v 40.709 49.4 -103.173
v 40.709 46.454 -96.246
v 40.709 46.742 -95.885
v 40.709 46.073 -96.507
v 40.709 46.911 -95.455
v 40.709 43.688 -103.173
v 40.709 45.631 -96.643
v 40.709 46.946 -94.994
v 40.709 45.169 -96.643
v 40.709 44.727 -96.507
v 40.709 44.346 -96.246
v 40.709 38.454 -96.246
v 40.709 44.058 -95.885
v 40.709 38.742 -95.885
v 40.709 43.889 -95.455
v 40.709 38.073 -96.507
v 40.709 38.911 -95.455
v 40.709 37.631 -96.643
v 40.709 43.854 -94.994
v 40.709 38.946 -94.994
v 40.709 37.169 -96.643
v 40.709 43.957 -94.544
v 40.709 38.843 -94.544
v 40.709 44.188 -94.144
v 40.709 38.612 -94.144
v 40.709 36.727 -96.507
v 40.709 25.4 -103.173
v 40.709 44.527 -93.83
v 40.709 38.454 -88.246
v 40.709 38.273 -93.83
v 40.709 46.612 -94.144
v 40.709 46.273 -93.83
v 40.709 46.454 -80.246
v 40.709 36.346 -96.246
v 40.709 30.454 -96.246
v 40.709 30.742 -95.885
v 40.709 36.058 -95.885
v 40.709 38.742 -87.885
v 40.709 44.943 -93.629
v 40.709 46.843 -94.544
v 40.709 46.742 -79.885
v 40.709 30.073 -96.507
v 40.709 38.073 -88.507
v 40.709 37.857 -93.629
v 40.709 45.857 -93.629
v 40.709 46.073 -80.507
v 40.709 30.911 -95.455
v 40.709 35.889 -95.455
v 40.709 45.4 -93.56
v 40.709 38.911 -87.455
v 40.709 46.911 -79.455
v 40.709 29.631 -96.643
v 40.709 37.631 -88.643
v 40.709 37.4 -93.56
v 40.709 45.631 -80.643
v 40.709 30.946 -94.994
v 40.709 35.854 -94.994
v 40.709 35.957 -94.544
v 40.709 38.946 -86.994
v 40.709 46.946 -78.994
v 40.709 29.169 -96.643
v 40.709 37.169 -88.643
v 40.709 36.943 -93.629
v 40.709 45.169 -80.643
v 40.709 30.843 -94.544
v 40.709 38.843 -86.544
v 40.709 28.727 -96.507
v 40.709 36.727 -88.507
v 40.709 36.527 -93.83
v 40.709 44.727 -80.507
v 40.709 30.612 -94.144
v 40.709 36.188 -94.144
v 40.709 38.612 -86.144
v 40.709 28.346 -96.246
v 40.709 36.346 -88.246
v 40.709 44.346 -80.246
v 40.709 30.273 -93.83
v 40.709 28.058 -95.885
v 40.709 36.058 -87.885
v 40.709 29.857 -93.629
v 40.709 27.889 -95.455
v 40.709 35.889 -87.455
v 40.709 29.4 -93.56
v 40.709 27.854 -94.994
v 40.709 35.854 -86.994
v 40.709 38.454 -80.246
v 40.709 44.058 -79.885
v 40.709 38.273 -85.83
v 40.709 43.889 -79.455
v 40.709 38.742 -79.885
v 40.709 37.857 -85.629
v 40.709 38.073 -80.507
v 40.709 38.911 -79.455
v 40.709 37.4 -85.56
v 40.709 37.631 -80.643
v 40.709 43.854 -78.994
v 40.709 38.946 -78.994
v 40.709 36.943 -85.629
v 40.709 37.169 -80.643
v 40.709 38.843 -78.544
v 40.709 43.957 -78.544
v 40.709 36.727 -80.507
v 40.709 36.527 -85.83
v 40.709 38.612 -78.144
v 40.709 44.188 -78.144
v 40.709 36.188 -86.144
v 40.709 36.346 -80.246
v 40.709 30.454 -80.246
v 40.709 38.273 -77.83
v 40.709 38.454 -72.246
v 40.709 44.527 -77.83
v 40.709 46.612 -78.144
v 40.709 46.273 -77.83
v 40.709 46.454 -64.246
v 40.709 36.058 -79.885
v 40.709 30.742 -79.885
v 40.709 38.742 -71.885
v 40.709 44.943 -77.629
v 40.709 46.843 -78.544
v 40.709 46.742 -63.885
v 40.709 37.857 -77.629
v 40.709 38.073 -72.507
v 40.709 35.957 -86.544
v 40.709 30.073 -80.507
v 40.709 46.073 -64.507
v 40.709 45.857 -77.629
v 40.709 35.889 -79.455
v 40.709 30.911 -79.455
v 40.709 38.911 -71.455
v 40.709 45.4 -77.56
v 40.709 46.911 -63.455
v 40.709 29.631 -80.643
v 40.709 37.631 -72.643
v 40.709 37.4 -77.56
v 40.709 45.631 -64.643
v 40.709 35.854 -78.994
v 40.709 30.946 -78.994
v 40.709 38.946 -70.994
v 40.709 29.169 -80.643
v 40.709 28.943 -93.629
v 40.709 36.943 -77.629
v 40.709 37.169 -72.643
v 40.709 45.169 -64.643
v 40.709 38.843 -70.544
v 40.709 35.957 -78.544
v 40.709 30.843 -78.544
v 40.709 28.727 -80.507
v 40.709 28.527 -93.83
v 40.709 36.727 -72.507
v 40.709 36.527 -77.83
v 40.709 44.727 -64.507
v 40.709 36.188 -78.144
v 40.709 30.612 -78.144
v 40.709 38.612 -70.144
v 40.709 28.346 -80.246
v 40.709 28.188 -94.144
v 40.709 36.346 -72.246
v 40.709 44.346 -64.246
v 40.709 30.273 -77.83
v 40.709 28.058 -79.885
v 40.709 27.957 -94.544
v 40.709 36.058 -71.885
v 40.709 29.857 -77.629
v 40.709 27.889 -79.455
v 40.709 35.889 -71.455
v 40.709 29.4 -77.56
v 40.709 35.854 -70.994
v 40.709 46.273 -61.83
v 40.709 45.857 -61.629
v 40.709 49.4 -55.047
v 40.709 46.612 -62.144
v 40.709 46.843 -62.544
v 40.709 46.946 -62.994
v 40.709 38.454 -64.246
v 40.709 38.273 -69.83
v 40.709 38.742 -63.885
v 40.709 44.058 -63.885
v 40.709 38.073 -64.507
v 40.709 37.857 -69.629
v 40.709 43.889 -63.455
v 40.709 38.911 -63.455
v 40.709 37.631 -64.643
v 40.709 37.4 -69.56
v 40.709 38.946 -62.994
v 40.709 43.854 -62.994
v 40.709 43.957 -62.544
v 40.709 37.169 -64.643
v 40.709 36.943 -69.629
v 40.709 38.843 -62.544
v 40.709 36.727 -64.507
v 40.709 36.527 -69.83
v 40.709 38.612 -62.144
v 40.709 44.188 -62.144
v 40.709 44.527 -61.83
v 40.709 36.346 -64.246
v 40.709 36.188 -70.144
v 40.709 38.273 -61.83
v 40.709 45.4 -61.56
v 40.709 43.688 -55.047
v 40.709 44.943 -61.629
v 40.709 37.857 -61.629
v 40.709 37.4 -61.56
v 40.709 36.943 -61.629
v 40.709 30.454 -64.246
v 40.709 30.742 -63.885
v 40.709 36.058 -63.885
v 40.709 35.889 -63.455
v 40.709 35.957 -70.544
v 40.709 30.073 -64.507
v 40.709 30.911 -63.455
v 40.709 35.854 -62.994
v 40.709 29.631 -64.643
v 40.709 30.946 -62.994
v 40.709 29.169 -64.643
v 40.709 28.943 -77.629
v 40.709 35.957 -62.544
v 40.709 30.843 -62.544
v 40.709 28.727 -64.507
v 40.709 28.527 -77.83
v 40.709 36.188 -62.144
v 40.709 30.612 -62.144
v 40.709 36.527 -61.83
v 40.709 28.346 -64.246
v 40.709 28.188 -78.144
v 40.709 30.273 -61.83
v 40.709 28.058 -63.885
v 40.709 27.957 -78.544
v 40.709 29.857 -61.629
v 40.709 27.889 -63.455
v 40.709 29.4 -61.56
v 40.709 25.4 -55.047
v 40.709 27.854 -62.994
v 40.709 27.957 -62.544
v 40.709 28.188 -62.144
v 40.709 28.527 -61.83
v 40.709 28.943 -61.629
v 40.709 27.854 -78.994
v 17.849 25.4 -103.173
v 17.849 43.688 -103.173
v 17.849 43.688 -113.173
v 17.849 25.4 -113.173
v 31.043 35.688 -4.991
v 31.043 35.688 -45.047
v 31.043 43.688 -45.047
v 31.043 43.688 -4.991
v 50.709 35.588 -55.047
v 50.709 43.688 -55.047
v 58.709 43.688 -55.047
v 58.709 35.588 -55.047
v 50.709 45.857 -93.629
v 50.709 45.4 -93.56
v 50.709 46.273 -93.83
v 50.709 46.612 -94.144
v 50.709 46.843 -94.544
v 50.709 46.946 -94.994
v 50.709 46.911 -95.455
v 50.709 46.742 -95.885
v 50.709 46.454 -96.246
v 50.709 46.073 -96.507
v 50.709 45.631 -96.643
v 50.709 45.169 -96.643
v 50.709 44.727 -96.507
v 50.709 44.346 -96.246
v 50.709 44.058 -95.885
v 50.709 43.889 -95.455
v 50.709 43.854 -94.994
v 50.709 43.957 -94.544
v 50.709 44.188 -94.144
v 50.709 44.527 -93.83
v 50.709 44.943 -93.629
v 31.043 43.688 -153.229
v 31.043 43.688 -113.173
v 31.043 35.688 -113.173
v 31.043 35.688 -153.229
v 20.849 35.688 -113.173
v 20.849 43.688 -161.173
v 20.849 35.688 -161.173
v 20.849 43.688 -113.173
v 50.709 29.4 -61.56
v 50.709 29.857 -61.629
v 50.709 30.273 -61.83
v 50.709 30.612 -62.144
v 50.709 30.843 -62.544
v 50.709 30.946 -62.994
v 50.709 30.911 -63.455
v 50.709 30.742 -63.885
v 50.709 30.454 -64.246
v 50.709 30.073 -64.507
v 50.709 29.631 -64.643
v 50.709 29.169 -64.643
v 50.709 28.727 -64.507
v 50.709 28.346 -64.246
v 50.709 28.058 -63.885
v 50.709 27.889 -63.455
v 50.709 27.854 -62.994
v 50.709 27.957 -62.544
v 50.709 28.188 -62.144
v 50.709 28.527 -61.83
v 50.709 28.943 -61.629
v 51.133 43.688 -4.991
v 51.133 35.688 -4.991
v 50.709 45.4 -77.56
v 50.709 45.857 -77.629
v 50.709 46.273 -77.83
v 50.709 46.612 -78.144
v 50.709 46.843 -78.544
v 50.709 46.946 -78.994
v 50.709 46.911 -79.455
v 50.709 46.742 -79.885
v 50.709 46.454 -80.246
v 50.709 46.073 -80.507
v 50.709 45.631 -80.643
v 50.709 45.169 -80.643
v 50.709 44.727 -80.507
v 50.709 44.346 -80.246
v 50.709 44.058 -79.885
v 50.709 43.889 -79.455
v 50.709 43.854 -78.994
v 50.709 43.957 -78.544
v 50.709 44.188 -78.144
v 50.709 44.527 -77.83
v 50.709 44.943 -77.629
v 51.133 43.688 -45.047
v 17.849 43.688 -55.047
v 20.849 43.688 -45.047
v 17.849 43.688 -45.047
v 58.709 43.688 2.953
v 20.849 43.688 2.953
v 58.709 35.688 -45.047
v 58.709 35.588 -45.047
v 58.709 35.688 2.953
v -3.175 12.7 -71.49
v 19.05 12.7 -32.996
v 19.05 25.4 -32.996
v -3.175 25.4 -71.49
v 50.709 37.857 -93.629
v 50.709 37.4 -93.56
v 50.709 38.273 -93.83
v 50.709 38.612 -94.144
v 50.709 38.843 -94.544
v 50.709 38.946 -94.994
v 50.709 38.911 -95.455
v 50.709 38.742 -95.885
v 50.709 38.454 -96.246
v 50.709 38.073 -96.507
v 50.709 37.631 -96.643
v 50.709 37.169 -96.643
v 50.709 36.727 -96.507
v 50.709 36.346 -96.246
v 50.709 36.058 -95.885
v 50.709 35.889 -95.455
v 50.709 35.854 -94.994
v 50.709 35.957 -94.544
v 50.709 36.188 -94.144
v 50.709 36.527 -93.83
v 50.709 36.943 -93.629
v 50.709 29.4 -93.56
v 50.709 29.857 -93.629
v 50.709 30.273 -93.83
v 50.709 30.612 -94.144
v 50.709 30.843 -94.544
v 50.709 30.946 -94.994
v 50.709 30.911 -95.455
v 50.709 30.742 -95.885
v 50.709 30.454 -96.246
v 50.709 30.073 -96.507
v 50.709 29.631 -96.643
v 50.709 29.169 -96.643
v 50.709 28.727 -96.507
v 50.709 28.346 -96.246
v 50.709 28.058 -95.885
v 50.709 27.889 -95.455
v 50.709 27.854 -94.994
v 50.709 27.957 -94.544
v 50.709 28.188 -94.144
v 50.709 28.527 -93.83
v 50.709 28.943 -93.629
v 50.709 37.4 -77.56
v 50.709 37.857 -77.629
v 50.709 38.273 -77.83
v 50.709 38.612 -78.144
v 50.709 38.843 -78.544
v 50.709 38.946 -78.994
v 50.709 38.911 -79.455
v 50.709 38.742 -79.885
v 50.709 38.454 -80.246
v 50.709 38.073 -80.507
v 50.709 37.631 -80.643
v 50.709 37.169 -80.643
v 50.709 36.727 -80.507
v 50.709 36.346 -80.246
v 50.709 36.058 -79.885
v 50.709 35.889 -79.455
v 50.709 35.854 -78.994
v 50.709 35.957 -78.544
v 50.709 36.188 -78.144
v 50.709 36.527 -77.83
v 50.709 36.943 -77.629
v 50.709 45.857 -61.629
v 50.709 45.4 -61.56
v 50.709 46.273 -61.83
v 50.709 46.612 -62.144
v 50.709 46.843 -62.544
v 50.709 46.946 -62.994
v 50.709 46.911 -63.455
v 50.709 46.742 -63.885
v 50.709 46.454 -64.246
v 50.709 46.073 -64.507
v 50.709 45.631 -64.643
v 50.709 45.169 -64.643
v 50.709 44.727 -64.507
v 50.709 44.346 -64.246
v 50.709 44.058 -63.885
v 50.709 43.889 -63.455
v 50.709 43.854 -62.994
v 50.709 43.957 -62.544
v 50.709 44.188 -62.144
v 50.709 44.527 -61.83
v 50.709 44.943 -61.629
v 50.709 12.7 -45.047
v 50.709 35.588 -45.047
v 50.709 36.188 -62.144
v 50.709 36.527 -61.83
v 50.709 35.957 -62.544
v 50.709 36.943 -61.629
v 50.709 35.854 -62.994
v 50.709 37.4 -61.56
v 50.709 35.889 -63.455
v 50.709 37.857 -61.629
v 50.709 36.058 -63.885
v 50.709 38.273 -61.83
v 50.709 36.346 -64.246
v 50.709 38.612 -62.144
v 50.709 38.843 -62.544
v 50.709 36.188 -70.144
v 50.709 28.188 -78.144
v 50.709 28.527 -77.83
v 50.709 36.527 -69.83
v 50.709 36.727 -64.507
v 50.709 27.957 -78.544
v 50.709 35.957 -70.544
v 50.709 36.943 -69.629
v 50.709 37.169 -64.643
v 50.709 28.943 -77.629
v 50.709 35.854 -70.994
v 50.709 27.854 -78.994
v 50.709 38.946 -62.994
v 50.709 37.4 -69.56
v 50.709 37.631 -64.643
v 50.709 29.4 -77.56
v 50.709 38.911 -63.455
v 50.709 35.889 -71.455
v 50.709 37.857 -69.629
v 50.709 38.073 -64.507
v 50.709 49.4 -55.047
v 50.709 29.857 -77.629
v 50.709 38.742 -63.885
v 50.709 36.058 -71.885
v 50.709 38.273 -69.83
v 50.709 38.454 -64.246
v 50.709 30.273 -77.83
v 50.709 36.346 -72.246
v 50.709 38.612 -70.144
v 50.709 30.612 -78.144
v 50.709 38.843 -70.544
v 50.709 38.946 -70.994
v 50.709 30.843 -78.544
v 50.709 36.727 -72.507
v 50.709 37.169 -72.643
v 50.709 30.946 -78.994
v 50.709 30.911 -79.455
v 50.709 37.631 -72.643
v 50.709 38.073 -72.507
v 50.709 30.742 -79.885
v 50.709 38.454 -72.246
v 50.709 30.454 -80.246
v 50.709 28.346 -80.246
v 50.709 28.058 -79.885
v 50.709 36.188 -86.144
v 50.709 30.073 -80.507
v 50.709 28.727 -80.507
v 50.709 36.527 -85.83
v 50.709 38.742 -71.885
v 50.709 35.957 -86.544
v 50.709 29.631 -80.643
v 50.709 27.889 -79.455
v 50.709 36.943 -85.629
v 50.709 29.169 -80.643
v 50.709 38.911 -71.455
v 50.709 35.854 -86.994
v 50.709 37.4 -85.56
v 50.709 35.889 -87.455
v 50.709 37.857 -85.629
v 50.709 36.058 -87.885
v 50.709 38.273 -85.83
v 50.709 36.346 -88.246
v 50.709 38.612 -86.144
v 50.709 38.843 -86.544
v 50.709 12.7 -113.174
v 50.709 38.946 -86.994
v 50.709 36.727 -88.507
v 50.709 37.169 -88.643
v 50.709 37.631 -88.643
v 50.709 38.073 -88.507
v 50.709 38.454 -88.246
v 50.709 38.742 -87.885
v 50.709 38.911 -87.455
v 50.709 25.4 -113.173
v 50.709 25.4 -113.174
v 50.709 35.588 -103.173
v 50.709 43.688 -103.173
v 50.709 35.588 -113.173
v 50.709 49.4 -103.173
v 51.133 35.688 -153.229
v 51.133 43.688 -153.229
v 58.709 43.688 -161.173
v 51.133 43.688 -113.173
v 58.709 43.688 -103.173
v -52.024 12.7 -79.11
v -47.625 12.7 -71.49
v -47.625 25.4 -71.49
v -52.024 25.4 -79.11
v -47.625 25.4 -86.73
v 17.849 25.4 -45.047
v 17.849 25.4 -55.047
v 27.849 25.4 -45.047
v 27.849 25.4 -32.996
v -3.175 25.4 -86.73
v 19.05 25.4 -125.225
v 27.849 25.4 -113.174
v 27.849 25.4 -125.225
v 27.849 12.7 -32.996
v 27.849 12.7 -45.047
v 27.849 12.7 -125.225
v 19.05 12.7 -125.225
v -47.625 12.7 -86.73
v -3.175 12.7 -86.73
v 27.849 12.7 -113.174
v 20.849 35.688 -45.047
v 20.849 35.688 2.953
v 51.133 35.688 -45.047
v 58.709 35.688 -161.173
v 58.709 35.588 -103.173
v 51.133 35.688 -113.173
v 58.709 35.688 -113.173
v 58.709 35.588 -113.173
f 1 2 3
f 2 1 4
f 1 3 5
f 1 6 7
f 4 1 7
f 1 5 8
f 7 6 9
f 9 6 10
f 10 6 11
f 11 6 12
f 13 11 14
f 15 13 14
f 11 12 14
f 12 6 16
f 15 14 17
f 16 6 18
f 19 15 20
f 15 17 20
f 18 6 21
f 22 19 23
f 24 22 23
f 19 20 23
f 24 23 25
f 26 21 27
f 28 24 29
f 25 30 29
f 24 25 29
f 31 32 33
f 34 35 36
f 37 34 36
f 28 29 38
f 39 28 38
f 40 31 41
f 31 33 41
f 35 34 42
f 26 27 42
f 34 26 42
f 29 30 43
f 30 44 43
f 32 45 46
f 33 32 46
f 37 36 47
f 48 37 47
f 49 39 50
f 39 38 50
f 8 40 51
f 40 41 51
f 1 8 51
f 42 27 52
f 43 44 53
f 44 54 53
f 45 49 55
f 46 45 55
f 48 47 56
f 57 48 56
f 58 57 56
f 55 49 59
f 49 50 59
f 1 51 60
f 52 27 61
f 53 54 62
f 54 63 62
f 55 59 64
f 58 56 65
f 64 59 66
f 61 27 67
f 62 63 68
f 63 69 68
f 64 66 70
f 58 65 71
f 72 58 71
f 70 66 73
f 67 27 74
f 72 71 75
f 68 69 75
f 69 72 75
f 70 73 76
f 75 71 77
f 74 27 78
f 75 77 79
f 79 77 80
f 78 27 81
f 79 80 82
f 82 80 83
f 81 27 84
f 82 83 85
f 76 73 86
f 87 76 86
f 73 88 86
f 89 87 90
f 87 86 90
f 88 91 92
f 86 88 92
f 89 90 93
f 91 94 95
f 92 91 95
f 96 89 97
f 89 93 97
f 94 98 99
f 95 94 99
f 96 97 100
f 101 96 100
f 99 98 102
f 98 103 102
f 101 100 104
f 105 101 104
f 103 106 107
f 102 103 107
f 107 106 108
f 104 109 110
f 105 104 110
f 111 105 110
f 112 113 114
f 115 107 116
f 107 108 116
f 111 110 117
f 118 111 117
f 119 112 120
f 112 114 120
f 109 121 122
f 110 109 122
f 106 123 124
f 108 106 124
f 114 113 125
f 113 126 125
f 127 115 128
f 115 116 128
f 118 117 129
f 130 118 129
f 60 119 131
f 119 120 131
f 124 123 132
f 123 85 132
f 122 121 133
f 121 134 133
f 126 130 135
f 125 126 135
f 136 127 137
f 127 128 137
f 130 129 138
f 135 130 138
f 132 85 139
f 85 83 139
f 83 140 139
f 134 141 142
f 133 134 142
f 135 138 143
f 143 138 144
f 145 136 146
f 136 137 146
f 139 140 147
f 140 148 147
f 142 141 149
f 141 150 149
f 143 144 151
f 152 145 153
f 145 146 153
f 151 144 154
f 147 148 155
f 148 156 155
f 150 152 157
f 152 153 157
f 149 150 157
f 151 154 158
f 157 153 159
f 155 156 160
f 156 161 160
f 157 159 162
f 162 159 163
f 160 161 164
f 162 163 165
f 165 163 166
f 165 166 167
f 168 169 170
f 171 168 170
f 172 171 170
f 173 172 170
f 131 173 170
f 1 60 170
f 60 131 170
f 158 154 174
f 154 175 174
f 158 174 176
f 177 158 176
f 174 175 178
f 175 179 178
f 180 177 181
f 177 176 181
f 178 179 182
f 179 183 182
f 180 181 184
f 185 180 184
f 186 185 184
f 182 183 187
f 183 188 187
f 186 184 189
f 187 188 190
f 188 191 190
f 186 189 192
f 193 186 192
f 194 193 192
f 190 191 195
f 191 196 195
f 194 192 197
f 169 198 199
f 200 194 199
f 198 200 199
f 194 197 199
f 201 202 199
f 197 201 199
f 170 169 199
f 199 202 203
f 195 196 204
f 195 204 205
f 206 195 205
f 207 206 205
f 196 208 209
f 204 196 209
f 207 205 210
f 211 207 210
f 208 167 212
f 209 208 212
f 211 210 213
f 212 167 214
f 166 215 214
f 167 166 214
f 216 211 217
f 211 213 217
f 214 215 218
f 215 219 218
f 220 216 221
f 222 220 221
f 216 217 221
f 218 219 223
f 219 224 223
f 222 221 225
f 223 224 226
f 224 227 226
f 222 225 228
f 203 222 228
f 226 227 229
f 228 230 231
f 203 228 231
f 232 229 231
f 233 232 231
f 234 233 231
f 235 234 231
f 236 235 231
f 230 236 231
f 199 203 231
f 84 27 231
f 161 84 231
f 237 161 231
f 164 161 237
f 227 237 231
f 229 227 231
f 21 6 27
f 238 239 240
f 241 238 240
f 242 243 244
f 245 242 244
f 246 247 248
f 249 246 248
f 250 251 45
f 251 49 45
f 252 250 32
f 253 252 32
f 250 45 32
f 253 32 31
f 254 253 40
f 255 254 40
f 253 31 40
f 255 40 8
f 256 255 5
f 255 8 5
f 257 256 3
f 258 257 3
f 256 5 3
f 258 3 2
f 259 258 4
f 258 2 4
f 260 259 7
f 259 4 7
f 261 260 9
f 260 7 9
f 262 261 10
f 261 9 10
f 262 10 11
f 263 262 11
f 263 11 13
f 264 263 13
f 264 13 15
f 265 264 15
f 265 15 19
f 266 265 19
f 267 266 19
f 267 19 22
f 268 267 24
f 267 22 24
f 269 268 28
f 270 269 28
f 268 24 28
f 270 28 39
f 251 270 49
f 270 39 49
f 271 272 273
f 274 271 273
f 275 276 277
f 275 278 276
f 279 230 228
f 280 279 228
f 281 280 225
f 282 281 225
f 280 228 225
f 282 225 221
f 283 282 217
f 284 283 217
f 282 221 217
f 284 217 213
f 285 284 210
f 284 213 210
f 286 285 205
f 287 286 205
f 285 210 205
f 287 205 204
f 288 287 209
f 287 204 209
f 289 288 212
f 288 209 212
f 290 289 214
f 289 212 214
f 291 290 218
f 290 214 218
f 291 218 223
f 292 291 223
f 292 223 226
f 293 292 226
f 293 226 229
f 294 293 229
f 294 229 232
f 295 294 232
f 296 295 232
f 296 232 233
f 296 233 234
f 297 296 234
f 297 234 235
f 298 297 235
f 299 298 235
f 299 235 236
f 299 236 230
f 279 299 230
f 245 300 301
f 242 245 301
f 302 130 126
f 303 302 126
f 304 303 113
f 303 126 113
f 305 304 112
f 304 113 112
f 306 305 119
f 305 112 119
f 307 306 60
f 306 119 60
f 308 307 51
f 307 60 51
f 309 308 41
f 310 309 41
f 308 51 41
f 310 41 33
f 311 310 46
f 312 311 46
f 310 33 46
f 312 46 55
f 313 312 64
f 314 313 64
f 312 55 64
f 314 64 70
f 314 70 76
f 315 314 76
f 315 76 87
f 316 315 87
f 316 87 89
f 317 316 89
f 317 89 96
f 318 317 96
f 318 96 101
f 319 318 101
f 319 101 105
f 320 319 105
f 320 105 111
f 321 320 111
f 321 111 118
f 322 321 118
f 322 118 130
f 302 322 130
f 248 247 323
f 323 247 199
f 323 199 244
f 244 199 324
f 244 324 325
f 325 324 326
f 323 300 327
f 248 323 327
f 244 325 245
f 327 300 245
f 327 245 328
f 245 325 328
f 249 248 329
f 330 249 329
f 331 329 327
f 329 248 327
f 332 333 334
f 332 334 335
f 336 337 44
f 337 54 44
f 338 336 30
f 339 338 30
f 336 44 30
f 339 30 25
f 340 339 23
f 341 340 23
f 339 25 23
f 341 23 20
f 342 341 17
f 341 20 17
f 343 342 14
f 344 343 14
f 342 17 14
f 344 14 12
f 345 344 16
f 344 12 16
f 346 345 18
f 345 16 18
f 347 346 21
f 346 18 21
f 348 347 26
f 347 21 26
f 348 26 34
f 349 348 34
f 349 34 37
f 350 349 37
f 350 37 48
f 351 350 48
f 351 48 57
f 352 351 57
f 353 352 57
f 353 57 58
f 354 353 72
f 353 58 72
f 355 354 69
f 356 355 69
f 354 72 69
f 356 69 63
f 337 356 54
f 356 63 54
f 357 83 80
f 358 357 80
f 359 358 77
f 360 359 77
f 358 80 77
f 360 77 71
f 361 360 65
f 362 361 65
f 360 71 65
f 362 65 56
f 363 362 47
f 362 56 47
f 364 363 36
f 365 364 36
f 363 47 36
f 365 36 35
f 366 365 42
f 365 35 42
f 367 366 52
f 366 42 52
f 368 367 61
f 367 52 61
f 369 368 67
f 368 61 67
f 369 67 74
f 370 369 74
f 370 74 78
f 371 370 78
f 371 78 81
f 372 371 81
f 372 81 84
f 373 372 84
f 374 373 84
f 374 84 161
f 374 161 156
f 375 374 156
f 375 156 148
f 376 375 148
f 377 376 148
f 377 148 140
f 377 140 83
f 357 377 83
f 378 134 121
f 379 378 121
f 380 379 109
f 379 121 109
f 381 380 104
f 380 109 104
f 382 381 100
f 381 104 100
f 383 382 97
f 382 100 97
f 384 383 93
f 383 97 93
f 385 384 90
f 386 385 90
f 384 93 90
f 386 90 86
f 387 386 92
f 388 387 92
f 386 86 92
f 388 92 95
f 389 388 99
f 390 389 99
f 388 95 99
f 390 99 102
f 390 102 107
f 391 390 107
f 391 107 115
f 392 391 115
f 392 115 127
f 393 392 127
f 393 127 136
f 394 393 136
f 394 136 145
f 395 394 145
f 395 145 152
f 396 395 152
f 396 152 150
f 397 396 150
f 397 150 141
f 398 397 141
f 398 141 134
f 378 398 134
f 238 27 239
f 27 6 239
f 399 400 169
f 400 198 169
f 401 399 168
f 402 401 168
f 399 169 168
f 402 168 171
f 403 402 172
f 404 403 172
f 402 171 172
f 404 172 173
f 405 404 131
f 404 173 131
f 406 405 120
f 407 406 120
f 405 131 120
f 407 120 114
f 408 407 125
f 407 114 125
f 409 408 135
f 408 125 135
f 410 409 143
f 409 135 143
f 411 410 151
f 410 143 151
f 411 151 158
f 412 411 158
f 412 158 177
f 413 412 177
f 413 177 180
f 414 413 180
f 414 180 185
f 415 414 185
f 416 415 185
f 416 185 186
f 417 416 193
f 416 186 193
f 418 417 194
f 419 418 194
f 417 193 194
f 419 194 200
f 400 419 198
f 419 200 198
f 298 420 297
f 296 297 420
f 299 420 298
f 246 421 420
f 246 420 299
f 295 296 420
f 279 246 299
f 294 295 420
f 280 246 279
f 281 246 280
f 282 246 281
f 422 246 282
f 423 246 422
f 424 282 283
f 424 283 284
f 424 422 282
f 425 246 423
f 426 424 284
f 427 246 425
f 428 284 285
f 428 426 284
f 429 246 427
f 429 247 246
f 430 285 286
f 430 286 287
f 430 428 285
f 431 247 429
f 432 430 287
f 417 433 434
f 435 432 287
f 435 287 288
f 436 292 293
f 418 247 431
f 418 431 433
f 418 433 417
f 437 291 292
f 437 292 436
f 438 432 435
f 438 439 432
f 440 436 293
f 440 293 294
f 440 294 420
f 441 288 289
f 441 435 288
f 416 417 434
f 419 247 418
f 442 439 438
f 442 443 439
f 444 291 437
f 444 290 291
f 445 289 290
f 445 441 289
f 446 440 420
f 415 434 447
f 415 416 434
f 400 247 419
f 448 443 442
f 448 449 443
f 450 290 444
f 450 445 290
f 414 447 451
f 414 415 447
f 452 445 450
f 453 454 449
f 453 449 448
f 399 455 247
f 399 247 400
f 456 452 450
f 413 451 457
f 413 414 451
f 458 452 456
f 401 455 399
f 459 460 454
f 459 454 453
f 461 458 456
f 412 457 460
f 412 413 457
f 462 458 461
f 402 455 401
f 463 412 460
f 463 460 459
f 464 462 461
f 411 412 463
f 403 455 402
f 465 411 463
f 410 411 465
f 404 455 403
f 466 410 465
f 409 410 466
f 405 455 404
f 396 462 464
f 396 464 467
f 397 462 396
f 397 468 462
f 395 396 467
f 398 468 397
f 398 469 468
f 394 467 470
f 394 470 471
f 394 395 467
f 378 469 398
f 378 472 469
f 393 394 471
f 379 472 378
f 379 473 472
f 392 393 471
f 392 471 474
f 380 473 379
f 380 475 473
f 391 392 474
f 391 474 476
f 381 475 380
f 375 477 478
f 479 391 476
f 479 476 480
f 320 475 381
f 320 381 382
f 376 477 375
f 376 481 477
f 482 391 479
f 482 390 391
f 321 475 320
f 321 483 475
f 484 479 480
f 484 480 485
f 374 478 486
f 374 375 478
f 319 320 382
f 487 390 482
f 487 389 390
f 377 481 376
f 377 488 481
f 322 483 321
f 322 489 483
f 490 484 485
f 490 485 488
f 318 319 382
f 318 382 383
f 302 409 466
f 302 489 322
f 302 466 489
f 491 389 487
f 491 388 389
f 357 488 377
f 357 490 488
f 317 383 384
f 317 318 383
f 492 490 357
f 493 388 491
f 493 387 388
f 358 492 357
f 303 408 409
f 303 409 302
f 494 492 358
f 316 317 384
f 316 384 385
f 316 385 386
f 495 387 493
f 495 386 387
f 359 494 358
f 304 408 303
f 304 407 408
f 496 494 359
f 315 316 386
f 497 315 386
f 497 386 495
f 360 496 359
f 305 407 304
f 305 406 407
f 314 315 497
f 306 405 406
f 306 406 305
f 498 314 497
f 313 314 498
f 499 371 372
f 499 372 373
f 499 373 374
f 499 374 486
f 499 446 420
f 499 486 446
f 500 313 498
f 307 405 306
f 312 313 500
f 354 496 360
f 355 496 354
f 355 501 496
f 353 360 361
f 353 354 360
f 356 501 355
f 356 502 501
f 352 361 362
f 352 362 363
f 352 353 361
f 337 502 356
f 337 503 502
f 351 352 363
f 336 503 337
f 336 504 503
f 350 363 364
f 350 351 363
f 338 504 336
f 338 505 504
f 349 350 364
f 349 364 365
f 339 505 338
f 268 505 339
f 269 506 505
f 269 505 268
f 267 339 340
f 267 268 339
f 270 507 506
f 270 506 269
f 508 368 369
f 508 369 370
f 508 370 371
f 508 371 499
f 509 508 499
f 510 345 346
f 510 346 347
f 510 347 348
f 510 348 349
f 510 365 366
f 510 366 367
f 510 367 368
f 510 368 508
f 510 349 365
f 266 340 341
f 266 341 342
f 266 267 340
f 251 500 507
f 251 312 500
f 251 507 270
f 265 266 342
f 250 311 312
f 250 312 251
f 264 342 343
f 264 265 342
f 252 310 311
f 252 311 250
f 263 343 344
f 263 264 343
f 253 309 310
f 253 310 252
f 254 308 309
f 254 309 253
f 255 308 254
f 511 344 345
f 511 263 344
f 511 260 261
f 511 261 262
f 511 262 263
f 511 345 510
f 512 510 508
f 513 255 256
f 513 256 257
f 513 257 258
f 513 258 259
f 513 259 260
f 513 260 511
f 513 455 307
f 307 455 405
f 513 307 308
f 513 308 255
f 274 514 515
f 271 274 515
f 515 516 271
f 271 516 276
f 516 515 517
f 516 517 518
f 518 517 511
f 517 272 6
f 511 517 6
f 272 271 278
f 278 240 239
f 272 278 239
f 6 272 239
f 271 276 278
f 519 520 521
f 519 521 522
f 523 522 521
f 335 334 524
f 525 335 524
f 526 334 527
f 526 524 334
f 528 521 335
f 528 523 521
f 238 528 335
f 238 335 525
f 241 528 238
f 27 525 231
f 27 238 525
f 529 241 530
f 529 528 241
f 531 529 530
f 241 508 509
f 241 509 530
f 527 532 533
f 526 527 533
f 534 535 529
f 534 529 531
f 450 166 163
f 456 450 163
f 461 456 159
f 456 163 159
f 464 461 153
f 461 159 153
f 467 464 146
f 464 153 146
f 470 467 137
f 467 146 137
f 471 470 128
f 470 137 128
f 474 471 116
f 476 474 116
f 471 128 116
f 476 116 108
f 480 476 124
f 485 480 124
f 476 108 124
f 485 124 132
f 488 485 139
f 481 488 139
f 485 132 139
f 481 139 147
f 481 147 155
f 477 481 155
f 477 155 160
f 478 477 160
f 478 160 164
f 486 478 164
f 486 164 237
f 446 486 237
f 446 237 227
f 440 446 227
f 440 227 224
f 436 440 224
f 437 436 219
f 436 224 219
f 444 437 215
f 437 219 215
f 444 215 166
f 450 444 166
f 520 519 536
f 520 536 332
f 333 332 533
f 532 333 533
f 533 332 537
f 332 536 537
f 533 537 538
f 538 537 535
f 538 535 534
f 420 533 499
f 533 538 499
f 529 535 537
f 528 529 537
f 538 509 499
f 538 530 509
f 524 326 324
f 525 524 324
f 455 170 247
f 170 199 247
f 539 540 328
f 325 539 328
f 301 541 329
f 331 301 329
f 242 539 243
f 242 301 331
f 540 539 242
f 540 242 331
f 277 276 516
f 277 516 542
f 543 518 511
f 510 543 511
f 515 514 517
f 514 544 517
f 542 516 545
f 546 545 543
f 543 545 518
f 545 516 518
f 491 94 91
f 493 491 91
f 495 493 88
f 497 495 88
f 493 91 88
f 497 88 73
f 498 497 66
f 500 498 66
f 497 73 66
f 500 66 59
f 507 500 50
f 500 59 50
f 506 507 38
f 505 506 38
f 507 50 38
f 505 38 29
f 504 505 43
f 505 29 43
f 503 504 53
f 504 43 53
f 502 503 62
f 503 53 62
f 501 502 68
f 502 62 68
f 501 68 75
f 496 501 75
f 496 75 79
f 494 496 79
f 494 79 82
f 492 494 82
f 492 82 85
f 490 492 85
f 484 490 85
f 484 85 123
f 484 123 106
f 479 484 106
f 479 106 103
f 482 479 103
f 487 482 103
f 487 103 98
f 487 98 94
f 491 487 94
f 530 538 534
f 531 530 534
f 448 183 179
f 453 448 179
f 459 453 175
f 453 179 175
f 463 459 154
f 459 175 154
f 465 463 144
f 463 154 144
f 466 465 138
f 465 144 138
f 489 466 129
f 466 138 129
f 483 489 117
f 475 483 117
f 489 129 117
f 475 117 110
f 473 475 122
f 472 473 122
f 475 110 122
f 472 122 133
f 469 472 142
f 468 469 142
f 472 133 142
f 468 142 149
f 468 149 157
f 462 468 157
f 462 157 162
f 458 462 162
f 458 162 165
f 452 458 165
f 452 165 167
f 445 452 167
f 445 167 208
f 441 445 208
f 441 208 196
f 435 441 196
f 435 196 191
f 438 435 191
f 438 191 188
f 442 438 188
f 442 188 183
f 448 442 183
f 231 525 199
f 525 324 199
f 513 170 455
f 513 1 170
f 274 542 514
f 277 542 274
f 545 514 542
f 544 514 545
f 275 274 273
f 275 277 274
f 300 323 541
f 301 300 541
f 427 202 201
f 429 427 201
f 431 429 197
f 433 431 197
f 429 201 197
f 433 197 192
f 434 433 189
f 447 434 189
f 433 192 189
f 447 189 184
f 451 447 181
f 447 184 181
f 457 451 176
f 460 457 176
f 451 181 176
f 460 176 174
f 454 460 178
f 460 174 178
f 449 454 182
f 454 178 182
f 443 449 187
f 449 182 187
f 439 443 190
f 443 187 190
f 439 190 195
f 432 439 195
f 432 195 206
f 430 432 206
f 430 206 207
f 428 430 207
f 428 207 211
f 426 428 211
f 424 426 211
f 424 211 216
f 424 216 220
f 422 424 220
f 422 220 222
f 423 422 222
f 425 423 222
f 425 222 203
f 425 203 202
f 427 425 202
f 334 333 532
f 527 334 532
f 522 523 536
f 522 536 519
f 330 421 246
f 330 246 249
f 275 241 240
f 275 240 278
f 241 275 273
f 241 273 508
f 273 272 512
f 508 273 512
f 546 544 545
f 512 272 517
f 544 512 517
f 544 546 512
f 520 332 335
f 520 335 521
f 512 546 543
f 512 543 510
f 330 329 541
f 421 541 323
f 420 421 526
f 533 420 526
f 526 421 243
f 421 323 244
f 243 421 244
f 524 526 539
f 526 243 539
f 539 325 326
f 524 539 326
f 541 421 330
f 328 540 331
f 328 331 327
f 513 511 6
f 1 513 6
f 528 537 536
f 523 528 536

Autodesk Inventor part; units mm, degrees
ref_plane "YZ Plane" through (0, 0, 0) normal (1, 0, 0) x (0, 1, 0)
ref_plane "XZ Plane" through (0, 0, 0) normal (0, 1, 0) x (-1, 0, 0)
ref_plane "XY Plane" through (0, 0, 0) normal (0, 0, 1) x (1, 0, 0)
ref_plane "Work Plane1" through (0, 12.7, 0) normal (0, 1, 0) x (1, 0, 0)
sketch "Sketch3" plane through (0, 12.7, 0) normal (0, 1, 0) x (1, 0, 0)
  line L0 (19.05, 32.9956) -> (-3.175, 71.4904)
  line L1 (19.05, 32.9956) -> (27.8488, 32.9956)
  line L2 (-47.625, 71.4904) -> (-52.0244, 79.1104)
  line L3 (27.8488, 32.9956) -> (27.8488, 32.9956)
  line L4 (27.8488, 32.9956) -> (27.8488, 32.9956)
  line L5 (1.2244, 79.1104) -> (-3.175, 71.4904)
  line L6 (-3.175, 71.4904) -> (-47.625, 71.4904)
  line L7 (1.2244, 79.1104) -> (27.8488, 32.9956)
  line L8 (27.8488, 32.9956) -> (19.05, 32.9956)
  line L9 (27.8488, 32.9956) -> (27.8488, 32.9956)
  line L10 (27.8488, 32.9956) -> (27.8488, 32.9956)
  line L11 (1.2244, 79.1104) -> (-52.0244, 79.1104)
  line L12 (19.05, 125.2252) -> (-3.175, 86.7304)
  line L13 (19.05, 125.2252) -> (27.8488, 125.2252)
  line L14 (-47.625, 86.7304) -> (-52.0244, 79.1104)
  line L15 (27.8488, 125.2252) -> (27.8488, 125.2252)
  line L16 (27.8488, 125.2252) -> (27.8488, 125.2252)
  line L17 (1.2244, 79.1104) -> (-3.175, 86.7304)
  line L18 (-3.175, 86.7304) -> (-47.625, 86.7304)
  line L19 (1.2244, 79.1104) -> (27.8488, 125.2252)
  line L20 (27.8488, 125.2252) -> (19.05, 125.2252)
  line L21 (27.8488, 125.2252) -> (27.8488, 125.2252)
  line L22 (27.8488, 125.2252) -> (27.8488, 125.2252)
  line L23 (27.8488, 32.9956) -> (27.8488, 125.2252)
  point P0 (-38.1, 71.4904)
  dimension "d53" = 8.7988
  dimension "d54" = 8.7988
  dimension "d59" = 90
  dimension "d60" = 120
  dimension "d62" = 120
  dimension "d163" = 44.45
  dimension "d173" = 60
ref_plane "Work Plane2" through (0, 88.9, 0) normal (0, 1, 0) x (1, 0, 0)
extrude "Extrusion11" add sketch "Sketch3" along normal blind 12.7 contours L0 L5 L7 L1 | L6 L2 L11 L5
extrude "Extrusion21" add sketch "Sketch3" along normal blind 12.7 contours L11 L14 L18 L17 | L17 L12 L13 L19
extrude "Extrusion22" add sketch "Sketch3" along normal blind 12.7 contours L7 L19 L23
sketch "Sketch15" plane through (27.8488, 12.7, -32.9956) normal (1, 0, 0) x (0, 0, -1)
  line L0 (0, 0) -> (0, 12.7) projected
  line L1 (0, 12.7) -> (12.0516, 12.7)
  line L2 (0, 12.7) -> (92.2297, 12.7) projected
  line L3 (92.2297, 0) -> (92.2297, 12.7) projected
  line L4 (92.2297, 12.7) -> (80.1781, 12.7)
  line L5 (12.0516, 12.7) -> (12.0516, 0)
  line L6 (38.4948, 0) -> (0, 0) projected
  line L7 (80.1781, 12.7) -> (80.1781, 0)
  line L8 (80.1781, 0) -> (12.0516, 0)
  line L9 (12.0516, 12.7) -> (80.1781, 12.7)
  point P0 (-32.9956, -12.7)
  point P1 (38.4948, 0)
  dimension "d180" = 12.0516
  dimension "d181" = 12.0516
extrude "Extrusion23" add sketch "Sketch15" along normal blind 22.86 contours L5 L2 L7 L8 L6
sketch "Sketch16" plane through (0, 25.4, 0) normal (0, 1, 0) x (1, 0, 0)
  line L0 (27.8488, 45.0472) -> (50.7088, 45.0472) projected
  line L1 (50.7088, 45.0472) -> (50.7088, 55.0472)
  line L2 (50.7088, 113.1736) -> (50.7088, 45.0472) projected
  line L3 (27.8488, 32.9956) -> (27.8488, 45.0472) projected
  line L4 (27.8488, 45.0472) -> (27.8488, 55.0472)
  line L5 (27.8488, 55.0472) -> (50.7088, 55.0472)
  line L6 (27.8488, 45.0472) -> (17.8488, 45.0472)
  line L7 (17.8488, 45.0472) -> (17.8488, 55.0472)
  line L8 (17.8488, 55.0472) -> (27.8488, 55.0472)
  point P0 (0, 0)
  dimension "d184" = 10
  dimension "d185" = 10
  dimension "d199" = 10
  dimension "d200" = 10
extrude "Extrusion24" add sketch "Sketch16" along normal blind 18.288
sketch "Sketch18" plane through (27.8488, 12.7, -45.0472) normal (0, 0, 1) x (1, 0, 0)
  line L0 (-7, 22.988) -> (-7, 30.988) projected
  line L1 (-7, 30.988) -> (-7, 22.988)
  line L2 (-7, 22.988) -> (3.1943, 22.988)
  line L3 (3.1943, 22.988) -> (3.1943, 30.988)
  line L4 (3.1943, 30.988) -> (-7, 30.988)
  point P0 (-27.8488, -12.7)
extrude "Extrusion26" add sketch "Sketch18" along normal blind 48
sketch "Sketch19" plane through (50.7088, 12.7, -32.9956) normal (1, 0, 0) x (0, 0, -1)
  line L0 (12.0516, 30.988) -> (22.0516, 30.988) projected
  line L1 (12.0516, 22.988) -> (22.0516, 22.988) projected
  line L2 (12.0516, 30.988) -> (12.0516, 22.988)
  line L3 (12.0516, 22.988) -> (22.0516, 22.988)
  line L4 (22.0516, 22.988) -> (22.0516, 30.988)
  line L5 (22.0516, 30.988) -> (12.0516, 30.988)
  point P0 (-32.9956, -12.7)
extrude "Extrusion27" add sketch "Sketch19" along normal blind 8
sketch "Sketch20" plane through (27.8488, 12.7, -45.0472) normal (0, 0, 1) x (1, 0, 0)
  line L0 (-10, 30.988) -> (30.86, 30.988) projected
  line L1 (30.86, 30.988) -> (23.2839, 30.988)
  line L2 (30.86, 30.988) -> (30.86, 22.988) projected
  line L3 (30.86, 30.988) -> (30.86, 22.988)
  line L4 (23.2839, 30.988) -> (23.2839, 22.988)
  line L5 (22.86, 22.988) -> (30.86, 22.988) projected
  line L6 (23.2839, 22.988) -> (30.86, 22.988)
  point P0 (-27.8488, -12.7)
  point P1 (-7, 30.988)
extrude "Extrusion28" add sketch "Sketch20" along normal blind 48
sketch "Sketch21" plane through (31.0431, 35.688, -45.0472) normal (1, 0, 0) x (0, 0, -1)
  line L0 (0, 8) -> (-48, 8) projected
  line L1 (-48, 8) -> (-40.0559, 8)
  line L2 (0, 0) -> (-48, 0) projected
  line L3 (-48, 8) -> (-40.0559, 8)
  line L4 (-40.0559, 8) -> (-40.0559, 0)
  line L5 (-40.0559, 0) -> (-48, 0)
  line L6 (-48, 0) -> (-48, 8)
  point P0 (-45.0472, -35.688)
  point P1 (-40.0559, 8)
extrude "Extrusion29" add sketch "Sketch21" along normal blind 24
sketch "Sketch22" plane through (20.8488, 35.688, -45.0472) normal (0, -1, 0) x (1, 0, 0)
  line L0 (29.86, -10) -> (29.86, 0) projected
  line L1 (29.86, 0) -> (29.86, -10)
  line L2 (-3, -10) -> (37.86, -10) projected
  line L3 (29.86, -10) -> (37.86, -10)
  line L4 (37.86, -10) -> (37.86, 0)
  line L5 (37.86, -10) -> (37.86, 48) projected
  line L6 (37.86, 0) -> (29.86, 0)
  line L7 (10.1943, 0) -> (30.2839, 0) projected
  point P0 (-20.8488, 45.0472)
extrude "Extrusion30" add sketch "Sketch22" along normal blind 0.1
sketch "Sketch23" plane through (27.8488, 12.7, -125.2252) normal (1, 0, 0) x (0, 0, -1)
  line L0 (0, 12.7) -> (-38.4948, 12.7) projected
  line L1 (0, 12.7) -> (-92.23, 12.7)
  line L2 (-92.23, 12.7) -> (-46.115, 12.7)
  line L3 (-46.115, 12.7) -> (-46.115, -5.4256)
  point P0 (-125.2252, -12.7)
  dimension "d206" = 92.23
  dimension "d207" = 46.115
ref_plane "Work Plane5" through (27.8488, 25.4, -79.1102) normal (0, 0, 1) x (0, -1, 0)
mirror "Mirror2" about plane through (27.8488, 25.4, -79.1102) normal (0, 0, 1) of "Extrusion24", "Extrusion26", "Extrusion27", "Extrusion28", "Extrusion29", "Extrusion30"
sketch "Sketch24" plane through (0, 25.4, 0) normal (0, 1, 0) x (1, 0, 0)
  line L0 (50.7088, 103.1733) -> (50.7088, 55.0472) projected
  line L1 (50.7088, 55.0472) -> (50.7088, 103.1733)
  line L2 (50.7088, 103.1733) -> (40.7088, 103.1733)
  line L3 (58.7088, 103.1733) -> (17.8488, 103.1733) projected
  line L4 (40.7088, 103.1733) -> (40.7088, 55.0472)
  line L5 (17.8488, 55.0472) -> (50.7088, 55.0472) projected
  line L6 (40.7088, 55.0472) -> (50.7088, 55.0472)
  point P0 (0, 0)
  dimension "d209" = 10
  dimension "d210" = 90
extrude "Extrusion31" add sketch "Sketch24" along normal blind 24
sketch "Sketch25" plane through (40.7088, 25.4, -103.1733) normal (-1, 0, 0) x (0, 0, 1)
  line L0 (0, 18.288) -> (0, 24) projected
  line L1 (48.1261, 0) -> (0, 0) projected
  line L2 (0, 24) -> (48.1261, 24)
  line L3 (48.1261, 24) -> (48.1261, 0)
  line L4 (48.1261, 0) -> (0, 0)
  line L5 (0, 0) -> (0, 24)
  line L6 (0, 24) -> (24.0631, 24)
  line L7 (24.0631, 24) -> (24.0631, 12)
  circle A0 centre (24.0631, 12) radius 1.55
  line L8 (24.0631, 12) -> (24.0631, 20)
  circle A1 centre (24.0631, 20) radius 1.55
  line L9 (24.0631, 12) -> (24.0631, 4)
  circle A2 centre (24.0631, 4) radius 1.55
  line L10 (24.0631, 12) -> (16.0631, 12)
  line L11 (16.0631, 12) -> (32.0631, 12)
  circle A3 centre (16.0631, 12) radius 1.55
  circle A4 centre (32.0631, 12) radius 1.55
  circle A5 centre (0.0631, 12) radius 1.55
  circle A6 centre (8.0631, 12) radius 1.55
  circle A7 centre (8.0631, 20) radius 1.55
  circle A8 centre (16.0631, 12) radius 1.55
  circle A9 centre (8.0631, 4) radius 1.55
  circle A10 centre (32.0631, 12) radius 1.55
  circle A11 centre (40.0631, 12) radius 1.55
  circle A12 centre (40.0631, 20) radius 1.55
  circle A13 centre (48.0631, 12) radius 1.55
  circle A14 centre (40.0631, 4) radius 1.55
  circle A15 centre (16.0631, 12) radius 1.55
  circle A16 centre (24.0631, 12) radius 1.55
  circle A17 centre (24.0631, 20) radius 1.55
  circle A18 centre (32.0631, 12) radius 1.55
  circle A19 centre (24.0631, 4) radius 1.55
  point P0 (103.1733, -25.4)
  dimension "d216" = 3.1
  dimension "d217" = 8
  dimension "d218" = 3.1
  dimension "d219" = 8
  dimension "d220" = 3.1
  dimension "d221" = 8
  dimension "d222" = 16
  dimension "d223" = 3.1
  dimension "d224" = 3.1
  dimension "d229" = 16
  dimension "d232" = 16
extrude "Extrusion32" cut sketch "Sketch25" against normal blind 14.75 contours A4 | A2 | A3 | A0 L11 L7 | L7 L10 A0 | A1 L7 | L7 A1 | L11 A0 L9 | L9 A0 L10 | A6 | A7 | A9 | A11 | A12 | A14
properties part number "HorizontalGrabberMain"
